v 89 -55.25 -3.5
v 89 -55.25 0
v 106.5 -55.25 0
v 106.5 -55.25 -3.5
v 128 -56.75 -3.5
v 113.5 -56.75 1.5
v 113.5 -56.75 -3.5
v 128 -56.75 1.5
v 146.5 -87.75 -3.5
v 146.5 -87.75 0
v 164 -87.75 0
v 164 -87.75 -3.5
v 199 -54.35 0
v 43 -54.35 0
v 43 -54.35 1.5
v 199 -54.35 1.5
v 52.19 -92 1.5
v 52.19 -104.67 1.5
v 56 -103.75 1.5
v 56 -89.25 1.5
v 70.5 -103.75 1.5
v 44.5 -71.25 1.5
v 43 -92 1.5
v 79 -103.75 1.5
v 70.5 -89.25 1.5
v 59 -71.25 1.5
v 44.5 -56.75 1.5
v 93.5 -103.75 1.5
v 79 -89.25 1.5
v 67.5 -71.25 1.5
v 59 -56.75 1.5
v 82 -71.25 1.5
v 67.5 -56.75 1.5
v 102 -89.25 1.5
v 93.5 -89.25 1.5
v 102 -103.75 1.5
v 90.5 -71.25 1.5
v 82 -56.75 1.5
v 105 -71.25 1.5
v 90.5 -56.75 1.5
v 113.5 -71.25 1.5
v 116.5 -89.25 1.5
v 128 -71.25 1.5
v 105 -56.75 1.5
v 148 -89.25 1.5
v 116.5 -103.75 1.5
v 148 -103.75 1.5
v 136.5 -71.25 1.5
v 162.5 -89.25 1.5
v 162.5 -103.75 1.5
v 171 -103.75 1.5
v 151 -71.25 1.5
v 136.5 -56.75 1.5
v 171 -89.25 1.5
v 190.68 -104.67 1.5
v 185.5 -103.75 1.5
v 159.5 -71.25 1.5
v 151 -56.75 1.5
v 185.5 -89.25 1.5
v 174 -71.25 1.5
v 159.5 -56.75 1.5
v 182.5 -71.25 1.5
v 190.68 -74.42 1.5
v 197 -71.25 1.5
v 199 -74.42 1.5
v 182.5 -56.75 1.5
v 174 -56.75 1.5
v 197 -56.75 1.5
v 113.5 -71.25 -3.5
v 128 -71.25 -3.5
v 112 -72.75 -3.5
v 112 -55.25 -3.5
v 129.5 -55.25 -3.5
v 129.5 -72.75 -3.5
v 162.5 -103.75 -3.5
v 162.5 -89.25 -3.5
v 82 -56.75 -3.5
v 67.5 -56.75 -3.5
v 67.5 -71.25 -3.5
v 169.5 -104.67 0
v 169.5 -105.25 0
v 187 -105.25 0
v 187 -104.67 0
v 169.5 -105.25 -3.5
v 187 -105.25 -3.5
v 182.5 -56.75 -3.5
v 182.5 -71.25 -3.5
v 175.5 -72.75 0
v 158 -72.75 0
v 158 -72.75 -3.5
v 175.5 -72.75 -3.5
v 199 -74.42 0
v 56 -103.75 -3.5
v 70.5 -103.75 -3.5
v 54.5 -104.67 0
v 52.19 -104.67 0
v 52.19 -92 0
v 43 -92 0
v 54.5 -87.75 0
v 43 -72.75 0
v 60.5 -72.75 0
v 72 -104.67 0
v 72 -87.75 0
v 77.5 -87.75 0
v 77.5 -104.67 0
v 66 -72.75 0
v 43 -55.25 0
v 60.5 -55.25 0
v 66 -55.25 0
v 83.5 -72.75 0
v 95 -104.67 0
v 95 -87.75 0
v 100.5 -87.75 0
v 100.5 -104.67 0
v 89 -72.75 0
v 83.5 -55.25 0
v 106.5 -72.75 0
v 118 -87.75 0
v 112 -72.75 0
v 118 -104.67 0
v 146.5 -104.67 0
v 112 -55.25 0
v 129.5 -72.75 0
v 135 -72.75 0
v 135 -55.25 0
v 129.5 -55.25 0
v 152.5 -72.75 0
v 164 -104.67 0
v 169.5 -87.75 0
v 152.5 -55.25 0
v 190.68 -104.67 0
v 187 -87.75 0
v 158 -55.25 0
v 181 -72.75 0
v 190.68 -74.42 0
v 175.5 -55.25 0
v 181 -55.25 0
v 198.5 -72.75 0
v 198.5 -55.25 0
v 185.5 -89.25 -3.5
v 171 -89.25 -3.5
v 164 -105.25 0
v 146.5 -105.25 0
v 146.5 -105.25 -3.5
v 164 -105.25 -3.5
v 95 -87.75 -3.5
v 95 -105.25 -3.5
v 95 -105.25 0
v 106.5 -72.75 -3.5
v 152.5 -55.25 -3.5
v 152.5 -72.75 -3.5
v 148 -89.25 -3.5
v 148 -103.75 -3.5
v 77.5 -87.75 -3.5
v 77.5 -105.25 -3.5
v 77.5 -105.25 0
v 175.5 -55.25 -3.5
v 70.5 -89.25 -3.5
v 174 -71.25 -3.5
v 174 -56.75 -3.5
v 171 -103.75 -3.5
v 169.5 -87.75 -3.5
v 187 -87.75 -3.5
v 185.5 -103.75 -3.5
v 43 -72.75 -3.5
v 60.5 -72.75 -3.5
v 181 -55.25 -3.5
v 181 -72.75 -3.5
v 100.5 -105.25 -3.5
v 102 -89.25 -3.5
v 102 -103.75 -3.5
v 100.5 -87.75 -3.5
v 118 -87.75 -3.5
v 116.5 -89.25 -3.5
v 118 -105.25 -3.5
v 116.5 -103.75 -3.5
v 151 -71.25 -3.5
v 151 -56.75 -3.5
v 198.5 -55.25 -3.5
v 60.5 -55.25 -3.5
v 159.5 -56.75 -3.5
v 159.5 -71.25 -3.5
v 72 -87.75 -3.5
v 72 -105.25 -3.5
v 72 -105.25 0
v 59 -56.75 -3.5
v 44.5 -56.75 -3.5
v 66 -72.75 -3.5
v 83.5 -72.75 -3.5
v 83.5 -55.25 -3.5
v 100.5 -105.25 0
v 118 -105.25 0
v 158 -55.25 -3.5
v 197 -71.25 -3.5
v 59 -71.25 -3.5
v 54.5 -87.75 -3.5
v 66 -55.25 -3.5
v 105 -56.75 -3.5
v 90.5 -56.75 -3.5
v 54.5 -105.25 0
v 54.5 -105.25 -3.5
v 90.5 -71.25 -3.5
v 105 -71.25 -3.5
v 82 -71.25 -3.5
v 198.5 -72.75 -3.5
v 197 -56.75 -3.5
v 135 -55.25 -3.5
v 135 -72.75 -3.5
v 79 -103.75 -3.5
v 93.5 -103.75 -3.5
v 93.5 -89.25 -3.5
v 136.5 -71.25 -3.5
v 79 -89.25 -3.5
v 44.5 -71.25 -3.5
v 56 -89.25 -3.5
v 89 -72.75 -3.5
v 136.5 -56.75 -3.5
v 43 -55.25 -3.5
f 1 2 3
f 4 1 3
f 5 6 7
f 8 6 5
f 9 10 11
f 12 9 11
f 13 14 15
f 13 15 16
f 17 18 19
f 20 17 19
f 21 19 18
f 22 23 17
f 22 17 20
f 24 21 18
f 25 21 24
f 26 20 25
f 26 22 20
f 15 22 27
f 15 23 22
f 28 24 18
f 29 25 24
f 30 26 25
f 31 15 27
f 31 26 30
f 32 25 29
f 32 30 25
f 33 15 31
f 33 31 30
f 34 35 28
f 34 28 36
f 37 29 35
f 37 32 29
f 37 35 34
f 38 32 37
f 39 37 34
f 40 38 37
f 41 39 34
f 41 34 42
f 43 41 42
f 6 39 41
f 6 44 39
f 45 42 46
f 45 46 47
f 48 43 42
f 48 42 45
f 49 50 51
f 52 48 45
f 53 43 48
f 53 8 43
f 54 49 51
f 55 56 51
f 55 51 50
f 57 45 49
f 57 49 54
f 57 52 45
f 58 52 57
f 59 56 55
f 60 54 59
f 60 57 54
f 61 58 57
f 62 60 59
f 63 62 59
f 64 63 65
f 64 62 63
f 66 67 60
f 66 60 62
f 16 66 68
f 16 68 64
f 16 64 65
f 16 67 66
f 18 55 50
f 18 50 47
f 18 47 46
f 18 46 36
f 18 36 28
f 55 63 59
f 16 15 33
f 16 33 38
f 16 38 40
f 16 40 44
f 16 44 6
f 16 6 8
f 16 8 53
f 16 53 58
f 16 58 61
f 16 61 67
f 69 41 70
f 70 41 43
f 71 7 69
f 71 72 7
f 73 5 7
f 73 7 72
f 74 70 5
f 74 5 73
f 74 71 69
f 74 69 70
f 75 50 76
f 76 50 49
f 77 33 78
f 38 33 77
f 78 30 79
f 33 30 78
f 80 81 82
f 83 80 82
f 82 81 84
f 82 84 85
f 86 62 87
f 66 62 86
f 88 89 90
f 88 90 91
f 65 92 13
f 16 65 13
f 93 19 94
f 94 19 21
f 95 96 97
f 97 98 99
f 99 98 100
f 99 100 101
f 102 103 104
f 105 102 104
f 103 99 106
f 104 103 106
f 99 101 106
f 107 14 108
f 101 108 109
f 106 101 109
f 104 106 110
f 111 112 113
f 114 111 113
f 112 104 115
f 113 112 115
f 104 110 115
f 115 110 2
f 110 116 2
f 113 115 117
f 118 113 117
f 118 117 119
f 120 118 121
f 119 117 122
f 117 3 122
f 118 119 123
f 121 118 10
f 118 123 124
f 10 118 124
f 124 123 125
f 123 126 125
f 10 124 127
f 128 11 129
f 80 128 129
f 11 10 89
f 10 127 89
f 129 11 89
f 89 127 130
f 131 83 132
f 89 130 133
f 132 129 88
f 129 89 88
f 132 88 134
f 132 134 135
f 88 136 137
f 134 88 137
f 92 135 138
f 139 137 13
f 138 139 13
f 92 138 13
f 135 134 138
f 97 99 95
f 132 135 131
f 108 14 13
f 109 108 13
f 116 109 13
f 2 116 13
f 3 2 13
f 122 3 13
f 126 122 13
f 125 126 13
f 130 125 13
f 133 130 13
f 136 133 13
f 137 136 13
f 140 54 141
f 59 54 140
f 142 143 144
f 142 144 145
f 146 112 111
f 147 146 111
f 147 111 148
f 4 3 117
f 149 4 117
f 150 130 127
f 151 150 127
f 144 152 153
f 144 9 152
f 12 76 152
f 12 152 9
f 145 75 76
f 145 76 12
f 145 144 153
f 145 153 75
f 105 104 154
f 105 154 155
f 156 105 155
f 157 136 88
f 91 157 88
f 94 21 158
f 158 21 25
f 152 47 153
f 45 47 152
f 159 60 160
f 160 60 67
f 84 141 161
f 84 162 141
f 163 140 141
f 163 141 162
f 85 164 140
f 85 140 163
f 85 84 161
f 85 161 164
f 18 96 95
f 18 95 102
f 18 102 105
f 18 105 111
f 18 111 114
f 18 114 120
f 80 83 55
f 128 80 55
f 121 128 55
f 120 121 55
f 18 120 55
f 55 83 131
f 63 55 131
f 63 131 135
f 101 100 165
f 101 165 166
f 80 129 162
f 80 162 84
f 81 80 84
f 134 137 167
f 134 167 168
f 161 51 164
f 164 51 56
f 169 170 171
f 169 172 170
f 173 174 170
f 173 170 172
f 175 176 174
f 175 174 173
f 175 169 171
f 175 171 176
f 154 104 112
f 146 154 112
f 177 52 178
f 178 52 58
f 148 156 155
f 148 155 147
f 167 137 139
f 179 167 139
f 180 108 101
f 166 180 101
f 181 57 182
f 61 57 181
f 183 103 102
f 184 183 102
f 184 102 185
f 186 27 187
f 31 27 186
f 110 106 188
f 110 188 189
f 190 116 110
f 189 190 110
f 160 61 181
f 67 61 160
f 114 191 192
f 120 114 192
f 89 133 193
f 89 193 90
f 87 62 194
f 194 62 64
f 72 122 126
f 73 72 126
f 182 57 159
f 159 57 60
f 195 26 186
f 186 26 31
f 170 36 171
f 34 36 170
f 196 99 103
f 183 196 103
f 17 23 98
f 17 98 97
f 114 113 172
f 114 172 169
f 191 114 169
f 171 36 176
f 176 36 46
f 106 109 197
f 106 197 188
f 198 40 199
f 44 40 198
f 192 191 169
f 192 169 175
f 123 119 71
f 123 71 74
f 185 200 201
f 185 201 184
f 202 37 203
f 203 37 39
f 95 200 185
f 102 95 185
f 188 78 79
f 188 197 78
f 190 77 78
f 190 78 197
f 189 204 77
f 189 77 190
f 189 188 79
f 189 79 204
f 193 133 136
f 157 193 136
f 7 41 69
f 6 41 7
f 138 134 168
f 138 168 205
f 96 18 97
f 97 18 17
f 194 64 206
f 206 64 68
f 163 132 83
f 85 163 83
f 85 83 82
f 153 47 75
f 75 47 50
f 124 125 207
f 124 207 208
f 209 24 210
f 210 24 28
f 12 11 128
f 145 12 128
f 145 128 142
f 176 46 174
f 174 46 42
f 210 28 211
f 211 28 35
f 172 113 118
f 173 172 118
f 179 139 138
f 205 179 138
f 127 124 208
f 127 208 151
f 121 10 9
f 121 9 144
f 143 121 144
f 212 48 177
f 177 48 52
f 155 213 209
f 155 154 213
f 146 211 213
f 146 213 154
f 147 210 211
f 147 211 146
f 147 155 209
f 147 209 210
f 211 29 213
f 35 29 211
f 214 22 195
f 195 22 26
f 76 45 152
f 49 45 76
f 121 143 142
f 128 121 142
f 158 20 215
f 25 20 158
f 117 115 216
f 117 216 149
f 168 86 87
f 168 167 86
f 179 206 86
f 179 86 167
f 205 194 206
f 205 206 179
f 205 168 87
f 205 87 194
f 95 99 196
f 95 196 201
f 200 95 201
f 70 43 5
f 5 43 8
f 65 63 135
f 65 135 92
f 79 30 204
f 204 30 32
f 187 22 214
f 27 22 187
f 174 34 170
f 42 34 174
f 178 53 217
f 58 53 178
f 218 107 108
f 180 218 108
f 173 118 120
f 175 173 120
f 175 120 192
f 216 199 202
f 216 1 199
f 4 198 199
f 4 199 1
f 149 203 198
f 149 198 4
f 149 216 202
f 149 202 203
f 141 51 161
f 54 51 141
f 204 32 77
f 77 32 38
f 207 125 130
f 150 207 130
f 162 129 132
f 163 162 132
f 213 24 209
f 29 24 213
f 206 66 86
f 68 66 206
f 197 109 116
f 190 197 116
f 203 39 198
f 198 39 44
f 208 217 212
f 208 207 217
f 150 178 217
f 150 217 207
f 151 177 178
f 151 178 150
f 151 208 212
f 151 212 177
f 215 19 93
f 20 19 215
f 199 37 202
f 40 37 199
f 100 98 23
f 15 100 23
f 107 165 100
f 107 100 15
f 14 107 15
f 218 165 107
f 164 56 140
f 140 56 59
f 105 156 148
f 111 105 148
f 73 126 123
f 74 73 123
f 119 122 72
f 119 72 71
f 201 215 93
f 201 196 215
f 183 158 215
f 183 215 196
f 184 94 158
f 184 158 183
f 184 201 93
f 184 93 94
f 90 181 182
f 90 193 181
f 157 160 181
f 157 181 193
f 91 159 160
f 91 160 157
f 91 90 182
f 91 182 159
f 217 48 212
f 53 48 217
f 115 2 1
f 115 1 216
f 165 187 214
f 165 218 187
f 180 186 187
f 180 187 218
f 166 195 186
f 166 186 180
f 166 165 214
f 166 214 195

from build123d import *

# Parameters (mm, degrees)
SKETCH001_W     = 156
SKETCH001_H     = 50.32
PAD_DEPTH       = 1.5
SKETCH004_W     = 17.5
SKETCH004_H     = 17.5
PAD001_DEPTH    = 3.5
SKETCH005_R     = 3.7
SKETCH005_W     = 14.5
SKETCH005_H     = 14.5
POCKET_DEPTH    = 5
SKETCH007_W     = 14.19
SKETCH007_H     = 16.92
SKETCH007_W_2   = 17.17
SKETCH007_H_2   = 38.96
POCKET001_DEPTH = 5


with BuildPart() as part:
    # Sketch001 → Pad (new body)
    with BuildSketch(Plane.XY):
        with Locations((121, -79.51)):
            Rectangle(SKETCH001_W, SKETCH001_H)
    extrude(amount=PAD_DEPTH)

    # Sketch004 (on DatumPlane) → Pad001 (join)
    with BuildSketch(Plane(origin=(0, 0, 0), x_dir=(1, 0, 0), z_dir=(0, 0, -1))):
        with Locations((51.75, 64)):
            Rectangle(SKETCH004_W, SKETCH004_H)
        with Locations((74.75, 64)):
            Rectangle(SKETCH004_W, SKETCH004_H)
        with Locations((97.75, 64)):
            Rectangle(SKETCH004_W, SKETCH004_H)
        with Locations((120.75, 64)):
            Rectangle(SKETCH004_W, SKETCH004_H)
        with Locations((143.75, 64)):
            Rectangle(SKETCH004_W, SKETCH004_H)
        with Locations((166.75, 64)):
            Rectangle(SKETCH004_W, SKETCH004_H)
        with Locations((189.75, 64)):
            Rectangle(SKETCH004_W, SKETCH004_H)
        with Locations((63.25, 96.5)):
            Rectangle(SKETCH004_W, SKETCH004_H)
        with Locations((86.25, 96.5)):
            Rectangle(SKETCH004_W, SKETCH004_H)
        with Locations((109.25, 96.5)):
            Rectangle(SKETCH004_W, SKETCH004_H)
        with Locations((155.25, 96.5)):
            Rectangle(SKETCH004_W, SKETCH004_H)
        with Locations((178.25, 96.5)):
            Rectangle(SKETCH004_W, SKETCH004_H)
    extrude(amount=PAD001_DEPTH)

    # Sketch005 (on DatumPlane) → Pocket (cut)
    with BuildSketch(Plane.XY.offset(1.5)):
        with Locations((114, -109)):
            Circle(SKETCH005_R)
        with Locations((51.75, -64)):
            Rectangle(SKETCH005_W, SKETCH005_H)
        with Locations((74.75, -64)):
            Rectangle(SKETCH005_W, SKETCH005_H)
        with Locations((97.75, -64)):
            Rectangle(SKETCH005_W, SKETCH005_H)
        with Locations((120.75, -64)):
            Rectangle(SKETCH005_W, SKETCH005_H)
        with Locations((143.75, -64)):
            Rectangle(SKETCH005_W, SKETCH005_H)
        with Locations((166.75, -64)):
            Rectangle(SKETCH005_W, SKETCH005_H)
        with Locations((189.75, -64)):
            Rectangle(SKETCH005_W, SKETCH005_H)
        with Locations((63.25, -96.5)):
            Rectangle(SKETCH005_W, SKETCH005_H)
        with Locations((86.25, -96.5)):
            Rectangle(SKETCH005_W, SKETCH005_H)
        with Locations((109.25, -96.5)):
            Rectangle(SKETCH005_W, SKETCH005_H)
        with Locations((155.25, -96.5)):
            Rectangle(SKETCH005_W, SKETCH005_H)
        with Locations((178.25, -96.5)):
            Rectangle(SKETCH005_W, SKETCH005_H)
    extrude(amount=-POCKET_DEPTH, mode=Mode.SUBTRACT)

    # Sketch007 → Pocket001 (cut)
    with BuildSketch(Plane.XY.offset(1.5)):
        with Locations((45.095, -100.46)):
            Rectangle(SKETCH007_W, SKETCH007_H)
        with Locations((199.265, -93.9)):
            Rectangle(SKETCH007_W_2, SKETCH007_H_2)
    extrude(amount=-POCKET001_DEPTH, mode=Mode.SUBTRACT)


solid = part.part
